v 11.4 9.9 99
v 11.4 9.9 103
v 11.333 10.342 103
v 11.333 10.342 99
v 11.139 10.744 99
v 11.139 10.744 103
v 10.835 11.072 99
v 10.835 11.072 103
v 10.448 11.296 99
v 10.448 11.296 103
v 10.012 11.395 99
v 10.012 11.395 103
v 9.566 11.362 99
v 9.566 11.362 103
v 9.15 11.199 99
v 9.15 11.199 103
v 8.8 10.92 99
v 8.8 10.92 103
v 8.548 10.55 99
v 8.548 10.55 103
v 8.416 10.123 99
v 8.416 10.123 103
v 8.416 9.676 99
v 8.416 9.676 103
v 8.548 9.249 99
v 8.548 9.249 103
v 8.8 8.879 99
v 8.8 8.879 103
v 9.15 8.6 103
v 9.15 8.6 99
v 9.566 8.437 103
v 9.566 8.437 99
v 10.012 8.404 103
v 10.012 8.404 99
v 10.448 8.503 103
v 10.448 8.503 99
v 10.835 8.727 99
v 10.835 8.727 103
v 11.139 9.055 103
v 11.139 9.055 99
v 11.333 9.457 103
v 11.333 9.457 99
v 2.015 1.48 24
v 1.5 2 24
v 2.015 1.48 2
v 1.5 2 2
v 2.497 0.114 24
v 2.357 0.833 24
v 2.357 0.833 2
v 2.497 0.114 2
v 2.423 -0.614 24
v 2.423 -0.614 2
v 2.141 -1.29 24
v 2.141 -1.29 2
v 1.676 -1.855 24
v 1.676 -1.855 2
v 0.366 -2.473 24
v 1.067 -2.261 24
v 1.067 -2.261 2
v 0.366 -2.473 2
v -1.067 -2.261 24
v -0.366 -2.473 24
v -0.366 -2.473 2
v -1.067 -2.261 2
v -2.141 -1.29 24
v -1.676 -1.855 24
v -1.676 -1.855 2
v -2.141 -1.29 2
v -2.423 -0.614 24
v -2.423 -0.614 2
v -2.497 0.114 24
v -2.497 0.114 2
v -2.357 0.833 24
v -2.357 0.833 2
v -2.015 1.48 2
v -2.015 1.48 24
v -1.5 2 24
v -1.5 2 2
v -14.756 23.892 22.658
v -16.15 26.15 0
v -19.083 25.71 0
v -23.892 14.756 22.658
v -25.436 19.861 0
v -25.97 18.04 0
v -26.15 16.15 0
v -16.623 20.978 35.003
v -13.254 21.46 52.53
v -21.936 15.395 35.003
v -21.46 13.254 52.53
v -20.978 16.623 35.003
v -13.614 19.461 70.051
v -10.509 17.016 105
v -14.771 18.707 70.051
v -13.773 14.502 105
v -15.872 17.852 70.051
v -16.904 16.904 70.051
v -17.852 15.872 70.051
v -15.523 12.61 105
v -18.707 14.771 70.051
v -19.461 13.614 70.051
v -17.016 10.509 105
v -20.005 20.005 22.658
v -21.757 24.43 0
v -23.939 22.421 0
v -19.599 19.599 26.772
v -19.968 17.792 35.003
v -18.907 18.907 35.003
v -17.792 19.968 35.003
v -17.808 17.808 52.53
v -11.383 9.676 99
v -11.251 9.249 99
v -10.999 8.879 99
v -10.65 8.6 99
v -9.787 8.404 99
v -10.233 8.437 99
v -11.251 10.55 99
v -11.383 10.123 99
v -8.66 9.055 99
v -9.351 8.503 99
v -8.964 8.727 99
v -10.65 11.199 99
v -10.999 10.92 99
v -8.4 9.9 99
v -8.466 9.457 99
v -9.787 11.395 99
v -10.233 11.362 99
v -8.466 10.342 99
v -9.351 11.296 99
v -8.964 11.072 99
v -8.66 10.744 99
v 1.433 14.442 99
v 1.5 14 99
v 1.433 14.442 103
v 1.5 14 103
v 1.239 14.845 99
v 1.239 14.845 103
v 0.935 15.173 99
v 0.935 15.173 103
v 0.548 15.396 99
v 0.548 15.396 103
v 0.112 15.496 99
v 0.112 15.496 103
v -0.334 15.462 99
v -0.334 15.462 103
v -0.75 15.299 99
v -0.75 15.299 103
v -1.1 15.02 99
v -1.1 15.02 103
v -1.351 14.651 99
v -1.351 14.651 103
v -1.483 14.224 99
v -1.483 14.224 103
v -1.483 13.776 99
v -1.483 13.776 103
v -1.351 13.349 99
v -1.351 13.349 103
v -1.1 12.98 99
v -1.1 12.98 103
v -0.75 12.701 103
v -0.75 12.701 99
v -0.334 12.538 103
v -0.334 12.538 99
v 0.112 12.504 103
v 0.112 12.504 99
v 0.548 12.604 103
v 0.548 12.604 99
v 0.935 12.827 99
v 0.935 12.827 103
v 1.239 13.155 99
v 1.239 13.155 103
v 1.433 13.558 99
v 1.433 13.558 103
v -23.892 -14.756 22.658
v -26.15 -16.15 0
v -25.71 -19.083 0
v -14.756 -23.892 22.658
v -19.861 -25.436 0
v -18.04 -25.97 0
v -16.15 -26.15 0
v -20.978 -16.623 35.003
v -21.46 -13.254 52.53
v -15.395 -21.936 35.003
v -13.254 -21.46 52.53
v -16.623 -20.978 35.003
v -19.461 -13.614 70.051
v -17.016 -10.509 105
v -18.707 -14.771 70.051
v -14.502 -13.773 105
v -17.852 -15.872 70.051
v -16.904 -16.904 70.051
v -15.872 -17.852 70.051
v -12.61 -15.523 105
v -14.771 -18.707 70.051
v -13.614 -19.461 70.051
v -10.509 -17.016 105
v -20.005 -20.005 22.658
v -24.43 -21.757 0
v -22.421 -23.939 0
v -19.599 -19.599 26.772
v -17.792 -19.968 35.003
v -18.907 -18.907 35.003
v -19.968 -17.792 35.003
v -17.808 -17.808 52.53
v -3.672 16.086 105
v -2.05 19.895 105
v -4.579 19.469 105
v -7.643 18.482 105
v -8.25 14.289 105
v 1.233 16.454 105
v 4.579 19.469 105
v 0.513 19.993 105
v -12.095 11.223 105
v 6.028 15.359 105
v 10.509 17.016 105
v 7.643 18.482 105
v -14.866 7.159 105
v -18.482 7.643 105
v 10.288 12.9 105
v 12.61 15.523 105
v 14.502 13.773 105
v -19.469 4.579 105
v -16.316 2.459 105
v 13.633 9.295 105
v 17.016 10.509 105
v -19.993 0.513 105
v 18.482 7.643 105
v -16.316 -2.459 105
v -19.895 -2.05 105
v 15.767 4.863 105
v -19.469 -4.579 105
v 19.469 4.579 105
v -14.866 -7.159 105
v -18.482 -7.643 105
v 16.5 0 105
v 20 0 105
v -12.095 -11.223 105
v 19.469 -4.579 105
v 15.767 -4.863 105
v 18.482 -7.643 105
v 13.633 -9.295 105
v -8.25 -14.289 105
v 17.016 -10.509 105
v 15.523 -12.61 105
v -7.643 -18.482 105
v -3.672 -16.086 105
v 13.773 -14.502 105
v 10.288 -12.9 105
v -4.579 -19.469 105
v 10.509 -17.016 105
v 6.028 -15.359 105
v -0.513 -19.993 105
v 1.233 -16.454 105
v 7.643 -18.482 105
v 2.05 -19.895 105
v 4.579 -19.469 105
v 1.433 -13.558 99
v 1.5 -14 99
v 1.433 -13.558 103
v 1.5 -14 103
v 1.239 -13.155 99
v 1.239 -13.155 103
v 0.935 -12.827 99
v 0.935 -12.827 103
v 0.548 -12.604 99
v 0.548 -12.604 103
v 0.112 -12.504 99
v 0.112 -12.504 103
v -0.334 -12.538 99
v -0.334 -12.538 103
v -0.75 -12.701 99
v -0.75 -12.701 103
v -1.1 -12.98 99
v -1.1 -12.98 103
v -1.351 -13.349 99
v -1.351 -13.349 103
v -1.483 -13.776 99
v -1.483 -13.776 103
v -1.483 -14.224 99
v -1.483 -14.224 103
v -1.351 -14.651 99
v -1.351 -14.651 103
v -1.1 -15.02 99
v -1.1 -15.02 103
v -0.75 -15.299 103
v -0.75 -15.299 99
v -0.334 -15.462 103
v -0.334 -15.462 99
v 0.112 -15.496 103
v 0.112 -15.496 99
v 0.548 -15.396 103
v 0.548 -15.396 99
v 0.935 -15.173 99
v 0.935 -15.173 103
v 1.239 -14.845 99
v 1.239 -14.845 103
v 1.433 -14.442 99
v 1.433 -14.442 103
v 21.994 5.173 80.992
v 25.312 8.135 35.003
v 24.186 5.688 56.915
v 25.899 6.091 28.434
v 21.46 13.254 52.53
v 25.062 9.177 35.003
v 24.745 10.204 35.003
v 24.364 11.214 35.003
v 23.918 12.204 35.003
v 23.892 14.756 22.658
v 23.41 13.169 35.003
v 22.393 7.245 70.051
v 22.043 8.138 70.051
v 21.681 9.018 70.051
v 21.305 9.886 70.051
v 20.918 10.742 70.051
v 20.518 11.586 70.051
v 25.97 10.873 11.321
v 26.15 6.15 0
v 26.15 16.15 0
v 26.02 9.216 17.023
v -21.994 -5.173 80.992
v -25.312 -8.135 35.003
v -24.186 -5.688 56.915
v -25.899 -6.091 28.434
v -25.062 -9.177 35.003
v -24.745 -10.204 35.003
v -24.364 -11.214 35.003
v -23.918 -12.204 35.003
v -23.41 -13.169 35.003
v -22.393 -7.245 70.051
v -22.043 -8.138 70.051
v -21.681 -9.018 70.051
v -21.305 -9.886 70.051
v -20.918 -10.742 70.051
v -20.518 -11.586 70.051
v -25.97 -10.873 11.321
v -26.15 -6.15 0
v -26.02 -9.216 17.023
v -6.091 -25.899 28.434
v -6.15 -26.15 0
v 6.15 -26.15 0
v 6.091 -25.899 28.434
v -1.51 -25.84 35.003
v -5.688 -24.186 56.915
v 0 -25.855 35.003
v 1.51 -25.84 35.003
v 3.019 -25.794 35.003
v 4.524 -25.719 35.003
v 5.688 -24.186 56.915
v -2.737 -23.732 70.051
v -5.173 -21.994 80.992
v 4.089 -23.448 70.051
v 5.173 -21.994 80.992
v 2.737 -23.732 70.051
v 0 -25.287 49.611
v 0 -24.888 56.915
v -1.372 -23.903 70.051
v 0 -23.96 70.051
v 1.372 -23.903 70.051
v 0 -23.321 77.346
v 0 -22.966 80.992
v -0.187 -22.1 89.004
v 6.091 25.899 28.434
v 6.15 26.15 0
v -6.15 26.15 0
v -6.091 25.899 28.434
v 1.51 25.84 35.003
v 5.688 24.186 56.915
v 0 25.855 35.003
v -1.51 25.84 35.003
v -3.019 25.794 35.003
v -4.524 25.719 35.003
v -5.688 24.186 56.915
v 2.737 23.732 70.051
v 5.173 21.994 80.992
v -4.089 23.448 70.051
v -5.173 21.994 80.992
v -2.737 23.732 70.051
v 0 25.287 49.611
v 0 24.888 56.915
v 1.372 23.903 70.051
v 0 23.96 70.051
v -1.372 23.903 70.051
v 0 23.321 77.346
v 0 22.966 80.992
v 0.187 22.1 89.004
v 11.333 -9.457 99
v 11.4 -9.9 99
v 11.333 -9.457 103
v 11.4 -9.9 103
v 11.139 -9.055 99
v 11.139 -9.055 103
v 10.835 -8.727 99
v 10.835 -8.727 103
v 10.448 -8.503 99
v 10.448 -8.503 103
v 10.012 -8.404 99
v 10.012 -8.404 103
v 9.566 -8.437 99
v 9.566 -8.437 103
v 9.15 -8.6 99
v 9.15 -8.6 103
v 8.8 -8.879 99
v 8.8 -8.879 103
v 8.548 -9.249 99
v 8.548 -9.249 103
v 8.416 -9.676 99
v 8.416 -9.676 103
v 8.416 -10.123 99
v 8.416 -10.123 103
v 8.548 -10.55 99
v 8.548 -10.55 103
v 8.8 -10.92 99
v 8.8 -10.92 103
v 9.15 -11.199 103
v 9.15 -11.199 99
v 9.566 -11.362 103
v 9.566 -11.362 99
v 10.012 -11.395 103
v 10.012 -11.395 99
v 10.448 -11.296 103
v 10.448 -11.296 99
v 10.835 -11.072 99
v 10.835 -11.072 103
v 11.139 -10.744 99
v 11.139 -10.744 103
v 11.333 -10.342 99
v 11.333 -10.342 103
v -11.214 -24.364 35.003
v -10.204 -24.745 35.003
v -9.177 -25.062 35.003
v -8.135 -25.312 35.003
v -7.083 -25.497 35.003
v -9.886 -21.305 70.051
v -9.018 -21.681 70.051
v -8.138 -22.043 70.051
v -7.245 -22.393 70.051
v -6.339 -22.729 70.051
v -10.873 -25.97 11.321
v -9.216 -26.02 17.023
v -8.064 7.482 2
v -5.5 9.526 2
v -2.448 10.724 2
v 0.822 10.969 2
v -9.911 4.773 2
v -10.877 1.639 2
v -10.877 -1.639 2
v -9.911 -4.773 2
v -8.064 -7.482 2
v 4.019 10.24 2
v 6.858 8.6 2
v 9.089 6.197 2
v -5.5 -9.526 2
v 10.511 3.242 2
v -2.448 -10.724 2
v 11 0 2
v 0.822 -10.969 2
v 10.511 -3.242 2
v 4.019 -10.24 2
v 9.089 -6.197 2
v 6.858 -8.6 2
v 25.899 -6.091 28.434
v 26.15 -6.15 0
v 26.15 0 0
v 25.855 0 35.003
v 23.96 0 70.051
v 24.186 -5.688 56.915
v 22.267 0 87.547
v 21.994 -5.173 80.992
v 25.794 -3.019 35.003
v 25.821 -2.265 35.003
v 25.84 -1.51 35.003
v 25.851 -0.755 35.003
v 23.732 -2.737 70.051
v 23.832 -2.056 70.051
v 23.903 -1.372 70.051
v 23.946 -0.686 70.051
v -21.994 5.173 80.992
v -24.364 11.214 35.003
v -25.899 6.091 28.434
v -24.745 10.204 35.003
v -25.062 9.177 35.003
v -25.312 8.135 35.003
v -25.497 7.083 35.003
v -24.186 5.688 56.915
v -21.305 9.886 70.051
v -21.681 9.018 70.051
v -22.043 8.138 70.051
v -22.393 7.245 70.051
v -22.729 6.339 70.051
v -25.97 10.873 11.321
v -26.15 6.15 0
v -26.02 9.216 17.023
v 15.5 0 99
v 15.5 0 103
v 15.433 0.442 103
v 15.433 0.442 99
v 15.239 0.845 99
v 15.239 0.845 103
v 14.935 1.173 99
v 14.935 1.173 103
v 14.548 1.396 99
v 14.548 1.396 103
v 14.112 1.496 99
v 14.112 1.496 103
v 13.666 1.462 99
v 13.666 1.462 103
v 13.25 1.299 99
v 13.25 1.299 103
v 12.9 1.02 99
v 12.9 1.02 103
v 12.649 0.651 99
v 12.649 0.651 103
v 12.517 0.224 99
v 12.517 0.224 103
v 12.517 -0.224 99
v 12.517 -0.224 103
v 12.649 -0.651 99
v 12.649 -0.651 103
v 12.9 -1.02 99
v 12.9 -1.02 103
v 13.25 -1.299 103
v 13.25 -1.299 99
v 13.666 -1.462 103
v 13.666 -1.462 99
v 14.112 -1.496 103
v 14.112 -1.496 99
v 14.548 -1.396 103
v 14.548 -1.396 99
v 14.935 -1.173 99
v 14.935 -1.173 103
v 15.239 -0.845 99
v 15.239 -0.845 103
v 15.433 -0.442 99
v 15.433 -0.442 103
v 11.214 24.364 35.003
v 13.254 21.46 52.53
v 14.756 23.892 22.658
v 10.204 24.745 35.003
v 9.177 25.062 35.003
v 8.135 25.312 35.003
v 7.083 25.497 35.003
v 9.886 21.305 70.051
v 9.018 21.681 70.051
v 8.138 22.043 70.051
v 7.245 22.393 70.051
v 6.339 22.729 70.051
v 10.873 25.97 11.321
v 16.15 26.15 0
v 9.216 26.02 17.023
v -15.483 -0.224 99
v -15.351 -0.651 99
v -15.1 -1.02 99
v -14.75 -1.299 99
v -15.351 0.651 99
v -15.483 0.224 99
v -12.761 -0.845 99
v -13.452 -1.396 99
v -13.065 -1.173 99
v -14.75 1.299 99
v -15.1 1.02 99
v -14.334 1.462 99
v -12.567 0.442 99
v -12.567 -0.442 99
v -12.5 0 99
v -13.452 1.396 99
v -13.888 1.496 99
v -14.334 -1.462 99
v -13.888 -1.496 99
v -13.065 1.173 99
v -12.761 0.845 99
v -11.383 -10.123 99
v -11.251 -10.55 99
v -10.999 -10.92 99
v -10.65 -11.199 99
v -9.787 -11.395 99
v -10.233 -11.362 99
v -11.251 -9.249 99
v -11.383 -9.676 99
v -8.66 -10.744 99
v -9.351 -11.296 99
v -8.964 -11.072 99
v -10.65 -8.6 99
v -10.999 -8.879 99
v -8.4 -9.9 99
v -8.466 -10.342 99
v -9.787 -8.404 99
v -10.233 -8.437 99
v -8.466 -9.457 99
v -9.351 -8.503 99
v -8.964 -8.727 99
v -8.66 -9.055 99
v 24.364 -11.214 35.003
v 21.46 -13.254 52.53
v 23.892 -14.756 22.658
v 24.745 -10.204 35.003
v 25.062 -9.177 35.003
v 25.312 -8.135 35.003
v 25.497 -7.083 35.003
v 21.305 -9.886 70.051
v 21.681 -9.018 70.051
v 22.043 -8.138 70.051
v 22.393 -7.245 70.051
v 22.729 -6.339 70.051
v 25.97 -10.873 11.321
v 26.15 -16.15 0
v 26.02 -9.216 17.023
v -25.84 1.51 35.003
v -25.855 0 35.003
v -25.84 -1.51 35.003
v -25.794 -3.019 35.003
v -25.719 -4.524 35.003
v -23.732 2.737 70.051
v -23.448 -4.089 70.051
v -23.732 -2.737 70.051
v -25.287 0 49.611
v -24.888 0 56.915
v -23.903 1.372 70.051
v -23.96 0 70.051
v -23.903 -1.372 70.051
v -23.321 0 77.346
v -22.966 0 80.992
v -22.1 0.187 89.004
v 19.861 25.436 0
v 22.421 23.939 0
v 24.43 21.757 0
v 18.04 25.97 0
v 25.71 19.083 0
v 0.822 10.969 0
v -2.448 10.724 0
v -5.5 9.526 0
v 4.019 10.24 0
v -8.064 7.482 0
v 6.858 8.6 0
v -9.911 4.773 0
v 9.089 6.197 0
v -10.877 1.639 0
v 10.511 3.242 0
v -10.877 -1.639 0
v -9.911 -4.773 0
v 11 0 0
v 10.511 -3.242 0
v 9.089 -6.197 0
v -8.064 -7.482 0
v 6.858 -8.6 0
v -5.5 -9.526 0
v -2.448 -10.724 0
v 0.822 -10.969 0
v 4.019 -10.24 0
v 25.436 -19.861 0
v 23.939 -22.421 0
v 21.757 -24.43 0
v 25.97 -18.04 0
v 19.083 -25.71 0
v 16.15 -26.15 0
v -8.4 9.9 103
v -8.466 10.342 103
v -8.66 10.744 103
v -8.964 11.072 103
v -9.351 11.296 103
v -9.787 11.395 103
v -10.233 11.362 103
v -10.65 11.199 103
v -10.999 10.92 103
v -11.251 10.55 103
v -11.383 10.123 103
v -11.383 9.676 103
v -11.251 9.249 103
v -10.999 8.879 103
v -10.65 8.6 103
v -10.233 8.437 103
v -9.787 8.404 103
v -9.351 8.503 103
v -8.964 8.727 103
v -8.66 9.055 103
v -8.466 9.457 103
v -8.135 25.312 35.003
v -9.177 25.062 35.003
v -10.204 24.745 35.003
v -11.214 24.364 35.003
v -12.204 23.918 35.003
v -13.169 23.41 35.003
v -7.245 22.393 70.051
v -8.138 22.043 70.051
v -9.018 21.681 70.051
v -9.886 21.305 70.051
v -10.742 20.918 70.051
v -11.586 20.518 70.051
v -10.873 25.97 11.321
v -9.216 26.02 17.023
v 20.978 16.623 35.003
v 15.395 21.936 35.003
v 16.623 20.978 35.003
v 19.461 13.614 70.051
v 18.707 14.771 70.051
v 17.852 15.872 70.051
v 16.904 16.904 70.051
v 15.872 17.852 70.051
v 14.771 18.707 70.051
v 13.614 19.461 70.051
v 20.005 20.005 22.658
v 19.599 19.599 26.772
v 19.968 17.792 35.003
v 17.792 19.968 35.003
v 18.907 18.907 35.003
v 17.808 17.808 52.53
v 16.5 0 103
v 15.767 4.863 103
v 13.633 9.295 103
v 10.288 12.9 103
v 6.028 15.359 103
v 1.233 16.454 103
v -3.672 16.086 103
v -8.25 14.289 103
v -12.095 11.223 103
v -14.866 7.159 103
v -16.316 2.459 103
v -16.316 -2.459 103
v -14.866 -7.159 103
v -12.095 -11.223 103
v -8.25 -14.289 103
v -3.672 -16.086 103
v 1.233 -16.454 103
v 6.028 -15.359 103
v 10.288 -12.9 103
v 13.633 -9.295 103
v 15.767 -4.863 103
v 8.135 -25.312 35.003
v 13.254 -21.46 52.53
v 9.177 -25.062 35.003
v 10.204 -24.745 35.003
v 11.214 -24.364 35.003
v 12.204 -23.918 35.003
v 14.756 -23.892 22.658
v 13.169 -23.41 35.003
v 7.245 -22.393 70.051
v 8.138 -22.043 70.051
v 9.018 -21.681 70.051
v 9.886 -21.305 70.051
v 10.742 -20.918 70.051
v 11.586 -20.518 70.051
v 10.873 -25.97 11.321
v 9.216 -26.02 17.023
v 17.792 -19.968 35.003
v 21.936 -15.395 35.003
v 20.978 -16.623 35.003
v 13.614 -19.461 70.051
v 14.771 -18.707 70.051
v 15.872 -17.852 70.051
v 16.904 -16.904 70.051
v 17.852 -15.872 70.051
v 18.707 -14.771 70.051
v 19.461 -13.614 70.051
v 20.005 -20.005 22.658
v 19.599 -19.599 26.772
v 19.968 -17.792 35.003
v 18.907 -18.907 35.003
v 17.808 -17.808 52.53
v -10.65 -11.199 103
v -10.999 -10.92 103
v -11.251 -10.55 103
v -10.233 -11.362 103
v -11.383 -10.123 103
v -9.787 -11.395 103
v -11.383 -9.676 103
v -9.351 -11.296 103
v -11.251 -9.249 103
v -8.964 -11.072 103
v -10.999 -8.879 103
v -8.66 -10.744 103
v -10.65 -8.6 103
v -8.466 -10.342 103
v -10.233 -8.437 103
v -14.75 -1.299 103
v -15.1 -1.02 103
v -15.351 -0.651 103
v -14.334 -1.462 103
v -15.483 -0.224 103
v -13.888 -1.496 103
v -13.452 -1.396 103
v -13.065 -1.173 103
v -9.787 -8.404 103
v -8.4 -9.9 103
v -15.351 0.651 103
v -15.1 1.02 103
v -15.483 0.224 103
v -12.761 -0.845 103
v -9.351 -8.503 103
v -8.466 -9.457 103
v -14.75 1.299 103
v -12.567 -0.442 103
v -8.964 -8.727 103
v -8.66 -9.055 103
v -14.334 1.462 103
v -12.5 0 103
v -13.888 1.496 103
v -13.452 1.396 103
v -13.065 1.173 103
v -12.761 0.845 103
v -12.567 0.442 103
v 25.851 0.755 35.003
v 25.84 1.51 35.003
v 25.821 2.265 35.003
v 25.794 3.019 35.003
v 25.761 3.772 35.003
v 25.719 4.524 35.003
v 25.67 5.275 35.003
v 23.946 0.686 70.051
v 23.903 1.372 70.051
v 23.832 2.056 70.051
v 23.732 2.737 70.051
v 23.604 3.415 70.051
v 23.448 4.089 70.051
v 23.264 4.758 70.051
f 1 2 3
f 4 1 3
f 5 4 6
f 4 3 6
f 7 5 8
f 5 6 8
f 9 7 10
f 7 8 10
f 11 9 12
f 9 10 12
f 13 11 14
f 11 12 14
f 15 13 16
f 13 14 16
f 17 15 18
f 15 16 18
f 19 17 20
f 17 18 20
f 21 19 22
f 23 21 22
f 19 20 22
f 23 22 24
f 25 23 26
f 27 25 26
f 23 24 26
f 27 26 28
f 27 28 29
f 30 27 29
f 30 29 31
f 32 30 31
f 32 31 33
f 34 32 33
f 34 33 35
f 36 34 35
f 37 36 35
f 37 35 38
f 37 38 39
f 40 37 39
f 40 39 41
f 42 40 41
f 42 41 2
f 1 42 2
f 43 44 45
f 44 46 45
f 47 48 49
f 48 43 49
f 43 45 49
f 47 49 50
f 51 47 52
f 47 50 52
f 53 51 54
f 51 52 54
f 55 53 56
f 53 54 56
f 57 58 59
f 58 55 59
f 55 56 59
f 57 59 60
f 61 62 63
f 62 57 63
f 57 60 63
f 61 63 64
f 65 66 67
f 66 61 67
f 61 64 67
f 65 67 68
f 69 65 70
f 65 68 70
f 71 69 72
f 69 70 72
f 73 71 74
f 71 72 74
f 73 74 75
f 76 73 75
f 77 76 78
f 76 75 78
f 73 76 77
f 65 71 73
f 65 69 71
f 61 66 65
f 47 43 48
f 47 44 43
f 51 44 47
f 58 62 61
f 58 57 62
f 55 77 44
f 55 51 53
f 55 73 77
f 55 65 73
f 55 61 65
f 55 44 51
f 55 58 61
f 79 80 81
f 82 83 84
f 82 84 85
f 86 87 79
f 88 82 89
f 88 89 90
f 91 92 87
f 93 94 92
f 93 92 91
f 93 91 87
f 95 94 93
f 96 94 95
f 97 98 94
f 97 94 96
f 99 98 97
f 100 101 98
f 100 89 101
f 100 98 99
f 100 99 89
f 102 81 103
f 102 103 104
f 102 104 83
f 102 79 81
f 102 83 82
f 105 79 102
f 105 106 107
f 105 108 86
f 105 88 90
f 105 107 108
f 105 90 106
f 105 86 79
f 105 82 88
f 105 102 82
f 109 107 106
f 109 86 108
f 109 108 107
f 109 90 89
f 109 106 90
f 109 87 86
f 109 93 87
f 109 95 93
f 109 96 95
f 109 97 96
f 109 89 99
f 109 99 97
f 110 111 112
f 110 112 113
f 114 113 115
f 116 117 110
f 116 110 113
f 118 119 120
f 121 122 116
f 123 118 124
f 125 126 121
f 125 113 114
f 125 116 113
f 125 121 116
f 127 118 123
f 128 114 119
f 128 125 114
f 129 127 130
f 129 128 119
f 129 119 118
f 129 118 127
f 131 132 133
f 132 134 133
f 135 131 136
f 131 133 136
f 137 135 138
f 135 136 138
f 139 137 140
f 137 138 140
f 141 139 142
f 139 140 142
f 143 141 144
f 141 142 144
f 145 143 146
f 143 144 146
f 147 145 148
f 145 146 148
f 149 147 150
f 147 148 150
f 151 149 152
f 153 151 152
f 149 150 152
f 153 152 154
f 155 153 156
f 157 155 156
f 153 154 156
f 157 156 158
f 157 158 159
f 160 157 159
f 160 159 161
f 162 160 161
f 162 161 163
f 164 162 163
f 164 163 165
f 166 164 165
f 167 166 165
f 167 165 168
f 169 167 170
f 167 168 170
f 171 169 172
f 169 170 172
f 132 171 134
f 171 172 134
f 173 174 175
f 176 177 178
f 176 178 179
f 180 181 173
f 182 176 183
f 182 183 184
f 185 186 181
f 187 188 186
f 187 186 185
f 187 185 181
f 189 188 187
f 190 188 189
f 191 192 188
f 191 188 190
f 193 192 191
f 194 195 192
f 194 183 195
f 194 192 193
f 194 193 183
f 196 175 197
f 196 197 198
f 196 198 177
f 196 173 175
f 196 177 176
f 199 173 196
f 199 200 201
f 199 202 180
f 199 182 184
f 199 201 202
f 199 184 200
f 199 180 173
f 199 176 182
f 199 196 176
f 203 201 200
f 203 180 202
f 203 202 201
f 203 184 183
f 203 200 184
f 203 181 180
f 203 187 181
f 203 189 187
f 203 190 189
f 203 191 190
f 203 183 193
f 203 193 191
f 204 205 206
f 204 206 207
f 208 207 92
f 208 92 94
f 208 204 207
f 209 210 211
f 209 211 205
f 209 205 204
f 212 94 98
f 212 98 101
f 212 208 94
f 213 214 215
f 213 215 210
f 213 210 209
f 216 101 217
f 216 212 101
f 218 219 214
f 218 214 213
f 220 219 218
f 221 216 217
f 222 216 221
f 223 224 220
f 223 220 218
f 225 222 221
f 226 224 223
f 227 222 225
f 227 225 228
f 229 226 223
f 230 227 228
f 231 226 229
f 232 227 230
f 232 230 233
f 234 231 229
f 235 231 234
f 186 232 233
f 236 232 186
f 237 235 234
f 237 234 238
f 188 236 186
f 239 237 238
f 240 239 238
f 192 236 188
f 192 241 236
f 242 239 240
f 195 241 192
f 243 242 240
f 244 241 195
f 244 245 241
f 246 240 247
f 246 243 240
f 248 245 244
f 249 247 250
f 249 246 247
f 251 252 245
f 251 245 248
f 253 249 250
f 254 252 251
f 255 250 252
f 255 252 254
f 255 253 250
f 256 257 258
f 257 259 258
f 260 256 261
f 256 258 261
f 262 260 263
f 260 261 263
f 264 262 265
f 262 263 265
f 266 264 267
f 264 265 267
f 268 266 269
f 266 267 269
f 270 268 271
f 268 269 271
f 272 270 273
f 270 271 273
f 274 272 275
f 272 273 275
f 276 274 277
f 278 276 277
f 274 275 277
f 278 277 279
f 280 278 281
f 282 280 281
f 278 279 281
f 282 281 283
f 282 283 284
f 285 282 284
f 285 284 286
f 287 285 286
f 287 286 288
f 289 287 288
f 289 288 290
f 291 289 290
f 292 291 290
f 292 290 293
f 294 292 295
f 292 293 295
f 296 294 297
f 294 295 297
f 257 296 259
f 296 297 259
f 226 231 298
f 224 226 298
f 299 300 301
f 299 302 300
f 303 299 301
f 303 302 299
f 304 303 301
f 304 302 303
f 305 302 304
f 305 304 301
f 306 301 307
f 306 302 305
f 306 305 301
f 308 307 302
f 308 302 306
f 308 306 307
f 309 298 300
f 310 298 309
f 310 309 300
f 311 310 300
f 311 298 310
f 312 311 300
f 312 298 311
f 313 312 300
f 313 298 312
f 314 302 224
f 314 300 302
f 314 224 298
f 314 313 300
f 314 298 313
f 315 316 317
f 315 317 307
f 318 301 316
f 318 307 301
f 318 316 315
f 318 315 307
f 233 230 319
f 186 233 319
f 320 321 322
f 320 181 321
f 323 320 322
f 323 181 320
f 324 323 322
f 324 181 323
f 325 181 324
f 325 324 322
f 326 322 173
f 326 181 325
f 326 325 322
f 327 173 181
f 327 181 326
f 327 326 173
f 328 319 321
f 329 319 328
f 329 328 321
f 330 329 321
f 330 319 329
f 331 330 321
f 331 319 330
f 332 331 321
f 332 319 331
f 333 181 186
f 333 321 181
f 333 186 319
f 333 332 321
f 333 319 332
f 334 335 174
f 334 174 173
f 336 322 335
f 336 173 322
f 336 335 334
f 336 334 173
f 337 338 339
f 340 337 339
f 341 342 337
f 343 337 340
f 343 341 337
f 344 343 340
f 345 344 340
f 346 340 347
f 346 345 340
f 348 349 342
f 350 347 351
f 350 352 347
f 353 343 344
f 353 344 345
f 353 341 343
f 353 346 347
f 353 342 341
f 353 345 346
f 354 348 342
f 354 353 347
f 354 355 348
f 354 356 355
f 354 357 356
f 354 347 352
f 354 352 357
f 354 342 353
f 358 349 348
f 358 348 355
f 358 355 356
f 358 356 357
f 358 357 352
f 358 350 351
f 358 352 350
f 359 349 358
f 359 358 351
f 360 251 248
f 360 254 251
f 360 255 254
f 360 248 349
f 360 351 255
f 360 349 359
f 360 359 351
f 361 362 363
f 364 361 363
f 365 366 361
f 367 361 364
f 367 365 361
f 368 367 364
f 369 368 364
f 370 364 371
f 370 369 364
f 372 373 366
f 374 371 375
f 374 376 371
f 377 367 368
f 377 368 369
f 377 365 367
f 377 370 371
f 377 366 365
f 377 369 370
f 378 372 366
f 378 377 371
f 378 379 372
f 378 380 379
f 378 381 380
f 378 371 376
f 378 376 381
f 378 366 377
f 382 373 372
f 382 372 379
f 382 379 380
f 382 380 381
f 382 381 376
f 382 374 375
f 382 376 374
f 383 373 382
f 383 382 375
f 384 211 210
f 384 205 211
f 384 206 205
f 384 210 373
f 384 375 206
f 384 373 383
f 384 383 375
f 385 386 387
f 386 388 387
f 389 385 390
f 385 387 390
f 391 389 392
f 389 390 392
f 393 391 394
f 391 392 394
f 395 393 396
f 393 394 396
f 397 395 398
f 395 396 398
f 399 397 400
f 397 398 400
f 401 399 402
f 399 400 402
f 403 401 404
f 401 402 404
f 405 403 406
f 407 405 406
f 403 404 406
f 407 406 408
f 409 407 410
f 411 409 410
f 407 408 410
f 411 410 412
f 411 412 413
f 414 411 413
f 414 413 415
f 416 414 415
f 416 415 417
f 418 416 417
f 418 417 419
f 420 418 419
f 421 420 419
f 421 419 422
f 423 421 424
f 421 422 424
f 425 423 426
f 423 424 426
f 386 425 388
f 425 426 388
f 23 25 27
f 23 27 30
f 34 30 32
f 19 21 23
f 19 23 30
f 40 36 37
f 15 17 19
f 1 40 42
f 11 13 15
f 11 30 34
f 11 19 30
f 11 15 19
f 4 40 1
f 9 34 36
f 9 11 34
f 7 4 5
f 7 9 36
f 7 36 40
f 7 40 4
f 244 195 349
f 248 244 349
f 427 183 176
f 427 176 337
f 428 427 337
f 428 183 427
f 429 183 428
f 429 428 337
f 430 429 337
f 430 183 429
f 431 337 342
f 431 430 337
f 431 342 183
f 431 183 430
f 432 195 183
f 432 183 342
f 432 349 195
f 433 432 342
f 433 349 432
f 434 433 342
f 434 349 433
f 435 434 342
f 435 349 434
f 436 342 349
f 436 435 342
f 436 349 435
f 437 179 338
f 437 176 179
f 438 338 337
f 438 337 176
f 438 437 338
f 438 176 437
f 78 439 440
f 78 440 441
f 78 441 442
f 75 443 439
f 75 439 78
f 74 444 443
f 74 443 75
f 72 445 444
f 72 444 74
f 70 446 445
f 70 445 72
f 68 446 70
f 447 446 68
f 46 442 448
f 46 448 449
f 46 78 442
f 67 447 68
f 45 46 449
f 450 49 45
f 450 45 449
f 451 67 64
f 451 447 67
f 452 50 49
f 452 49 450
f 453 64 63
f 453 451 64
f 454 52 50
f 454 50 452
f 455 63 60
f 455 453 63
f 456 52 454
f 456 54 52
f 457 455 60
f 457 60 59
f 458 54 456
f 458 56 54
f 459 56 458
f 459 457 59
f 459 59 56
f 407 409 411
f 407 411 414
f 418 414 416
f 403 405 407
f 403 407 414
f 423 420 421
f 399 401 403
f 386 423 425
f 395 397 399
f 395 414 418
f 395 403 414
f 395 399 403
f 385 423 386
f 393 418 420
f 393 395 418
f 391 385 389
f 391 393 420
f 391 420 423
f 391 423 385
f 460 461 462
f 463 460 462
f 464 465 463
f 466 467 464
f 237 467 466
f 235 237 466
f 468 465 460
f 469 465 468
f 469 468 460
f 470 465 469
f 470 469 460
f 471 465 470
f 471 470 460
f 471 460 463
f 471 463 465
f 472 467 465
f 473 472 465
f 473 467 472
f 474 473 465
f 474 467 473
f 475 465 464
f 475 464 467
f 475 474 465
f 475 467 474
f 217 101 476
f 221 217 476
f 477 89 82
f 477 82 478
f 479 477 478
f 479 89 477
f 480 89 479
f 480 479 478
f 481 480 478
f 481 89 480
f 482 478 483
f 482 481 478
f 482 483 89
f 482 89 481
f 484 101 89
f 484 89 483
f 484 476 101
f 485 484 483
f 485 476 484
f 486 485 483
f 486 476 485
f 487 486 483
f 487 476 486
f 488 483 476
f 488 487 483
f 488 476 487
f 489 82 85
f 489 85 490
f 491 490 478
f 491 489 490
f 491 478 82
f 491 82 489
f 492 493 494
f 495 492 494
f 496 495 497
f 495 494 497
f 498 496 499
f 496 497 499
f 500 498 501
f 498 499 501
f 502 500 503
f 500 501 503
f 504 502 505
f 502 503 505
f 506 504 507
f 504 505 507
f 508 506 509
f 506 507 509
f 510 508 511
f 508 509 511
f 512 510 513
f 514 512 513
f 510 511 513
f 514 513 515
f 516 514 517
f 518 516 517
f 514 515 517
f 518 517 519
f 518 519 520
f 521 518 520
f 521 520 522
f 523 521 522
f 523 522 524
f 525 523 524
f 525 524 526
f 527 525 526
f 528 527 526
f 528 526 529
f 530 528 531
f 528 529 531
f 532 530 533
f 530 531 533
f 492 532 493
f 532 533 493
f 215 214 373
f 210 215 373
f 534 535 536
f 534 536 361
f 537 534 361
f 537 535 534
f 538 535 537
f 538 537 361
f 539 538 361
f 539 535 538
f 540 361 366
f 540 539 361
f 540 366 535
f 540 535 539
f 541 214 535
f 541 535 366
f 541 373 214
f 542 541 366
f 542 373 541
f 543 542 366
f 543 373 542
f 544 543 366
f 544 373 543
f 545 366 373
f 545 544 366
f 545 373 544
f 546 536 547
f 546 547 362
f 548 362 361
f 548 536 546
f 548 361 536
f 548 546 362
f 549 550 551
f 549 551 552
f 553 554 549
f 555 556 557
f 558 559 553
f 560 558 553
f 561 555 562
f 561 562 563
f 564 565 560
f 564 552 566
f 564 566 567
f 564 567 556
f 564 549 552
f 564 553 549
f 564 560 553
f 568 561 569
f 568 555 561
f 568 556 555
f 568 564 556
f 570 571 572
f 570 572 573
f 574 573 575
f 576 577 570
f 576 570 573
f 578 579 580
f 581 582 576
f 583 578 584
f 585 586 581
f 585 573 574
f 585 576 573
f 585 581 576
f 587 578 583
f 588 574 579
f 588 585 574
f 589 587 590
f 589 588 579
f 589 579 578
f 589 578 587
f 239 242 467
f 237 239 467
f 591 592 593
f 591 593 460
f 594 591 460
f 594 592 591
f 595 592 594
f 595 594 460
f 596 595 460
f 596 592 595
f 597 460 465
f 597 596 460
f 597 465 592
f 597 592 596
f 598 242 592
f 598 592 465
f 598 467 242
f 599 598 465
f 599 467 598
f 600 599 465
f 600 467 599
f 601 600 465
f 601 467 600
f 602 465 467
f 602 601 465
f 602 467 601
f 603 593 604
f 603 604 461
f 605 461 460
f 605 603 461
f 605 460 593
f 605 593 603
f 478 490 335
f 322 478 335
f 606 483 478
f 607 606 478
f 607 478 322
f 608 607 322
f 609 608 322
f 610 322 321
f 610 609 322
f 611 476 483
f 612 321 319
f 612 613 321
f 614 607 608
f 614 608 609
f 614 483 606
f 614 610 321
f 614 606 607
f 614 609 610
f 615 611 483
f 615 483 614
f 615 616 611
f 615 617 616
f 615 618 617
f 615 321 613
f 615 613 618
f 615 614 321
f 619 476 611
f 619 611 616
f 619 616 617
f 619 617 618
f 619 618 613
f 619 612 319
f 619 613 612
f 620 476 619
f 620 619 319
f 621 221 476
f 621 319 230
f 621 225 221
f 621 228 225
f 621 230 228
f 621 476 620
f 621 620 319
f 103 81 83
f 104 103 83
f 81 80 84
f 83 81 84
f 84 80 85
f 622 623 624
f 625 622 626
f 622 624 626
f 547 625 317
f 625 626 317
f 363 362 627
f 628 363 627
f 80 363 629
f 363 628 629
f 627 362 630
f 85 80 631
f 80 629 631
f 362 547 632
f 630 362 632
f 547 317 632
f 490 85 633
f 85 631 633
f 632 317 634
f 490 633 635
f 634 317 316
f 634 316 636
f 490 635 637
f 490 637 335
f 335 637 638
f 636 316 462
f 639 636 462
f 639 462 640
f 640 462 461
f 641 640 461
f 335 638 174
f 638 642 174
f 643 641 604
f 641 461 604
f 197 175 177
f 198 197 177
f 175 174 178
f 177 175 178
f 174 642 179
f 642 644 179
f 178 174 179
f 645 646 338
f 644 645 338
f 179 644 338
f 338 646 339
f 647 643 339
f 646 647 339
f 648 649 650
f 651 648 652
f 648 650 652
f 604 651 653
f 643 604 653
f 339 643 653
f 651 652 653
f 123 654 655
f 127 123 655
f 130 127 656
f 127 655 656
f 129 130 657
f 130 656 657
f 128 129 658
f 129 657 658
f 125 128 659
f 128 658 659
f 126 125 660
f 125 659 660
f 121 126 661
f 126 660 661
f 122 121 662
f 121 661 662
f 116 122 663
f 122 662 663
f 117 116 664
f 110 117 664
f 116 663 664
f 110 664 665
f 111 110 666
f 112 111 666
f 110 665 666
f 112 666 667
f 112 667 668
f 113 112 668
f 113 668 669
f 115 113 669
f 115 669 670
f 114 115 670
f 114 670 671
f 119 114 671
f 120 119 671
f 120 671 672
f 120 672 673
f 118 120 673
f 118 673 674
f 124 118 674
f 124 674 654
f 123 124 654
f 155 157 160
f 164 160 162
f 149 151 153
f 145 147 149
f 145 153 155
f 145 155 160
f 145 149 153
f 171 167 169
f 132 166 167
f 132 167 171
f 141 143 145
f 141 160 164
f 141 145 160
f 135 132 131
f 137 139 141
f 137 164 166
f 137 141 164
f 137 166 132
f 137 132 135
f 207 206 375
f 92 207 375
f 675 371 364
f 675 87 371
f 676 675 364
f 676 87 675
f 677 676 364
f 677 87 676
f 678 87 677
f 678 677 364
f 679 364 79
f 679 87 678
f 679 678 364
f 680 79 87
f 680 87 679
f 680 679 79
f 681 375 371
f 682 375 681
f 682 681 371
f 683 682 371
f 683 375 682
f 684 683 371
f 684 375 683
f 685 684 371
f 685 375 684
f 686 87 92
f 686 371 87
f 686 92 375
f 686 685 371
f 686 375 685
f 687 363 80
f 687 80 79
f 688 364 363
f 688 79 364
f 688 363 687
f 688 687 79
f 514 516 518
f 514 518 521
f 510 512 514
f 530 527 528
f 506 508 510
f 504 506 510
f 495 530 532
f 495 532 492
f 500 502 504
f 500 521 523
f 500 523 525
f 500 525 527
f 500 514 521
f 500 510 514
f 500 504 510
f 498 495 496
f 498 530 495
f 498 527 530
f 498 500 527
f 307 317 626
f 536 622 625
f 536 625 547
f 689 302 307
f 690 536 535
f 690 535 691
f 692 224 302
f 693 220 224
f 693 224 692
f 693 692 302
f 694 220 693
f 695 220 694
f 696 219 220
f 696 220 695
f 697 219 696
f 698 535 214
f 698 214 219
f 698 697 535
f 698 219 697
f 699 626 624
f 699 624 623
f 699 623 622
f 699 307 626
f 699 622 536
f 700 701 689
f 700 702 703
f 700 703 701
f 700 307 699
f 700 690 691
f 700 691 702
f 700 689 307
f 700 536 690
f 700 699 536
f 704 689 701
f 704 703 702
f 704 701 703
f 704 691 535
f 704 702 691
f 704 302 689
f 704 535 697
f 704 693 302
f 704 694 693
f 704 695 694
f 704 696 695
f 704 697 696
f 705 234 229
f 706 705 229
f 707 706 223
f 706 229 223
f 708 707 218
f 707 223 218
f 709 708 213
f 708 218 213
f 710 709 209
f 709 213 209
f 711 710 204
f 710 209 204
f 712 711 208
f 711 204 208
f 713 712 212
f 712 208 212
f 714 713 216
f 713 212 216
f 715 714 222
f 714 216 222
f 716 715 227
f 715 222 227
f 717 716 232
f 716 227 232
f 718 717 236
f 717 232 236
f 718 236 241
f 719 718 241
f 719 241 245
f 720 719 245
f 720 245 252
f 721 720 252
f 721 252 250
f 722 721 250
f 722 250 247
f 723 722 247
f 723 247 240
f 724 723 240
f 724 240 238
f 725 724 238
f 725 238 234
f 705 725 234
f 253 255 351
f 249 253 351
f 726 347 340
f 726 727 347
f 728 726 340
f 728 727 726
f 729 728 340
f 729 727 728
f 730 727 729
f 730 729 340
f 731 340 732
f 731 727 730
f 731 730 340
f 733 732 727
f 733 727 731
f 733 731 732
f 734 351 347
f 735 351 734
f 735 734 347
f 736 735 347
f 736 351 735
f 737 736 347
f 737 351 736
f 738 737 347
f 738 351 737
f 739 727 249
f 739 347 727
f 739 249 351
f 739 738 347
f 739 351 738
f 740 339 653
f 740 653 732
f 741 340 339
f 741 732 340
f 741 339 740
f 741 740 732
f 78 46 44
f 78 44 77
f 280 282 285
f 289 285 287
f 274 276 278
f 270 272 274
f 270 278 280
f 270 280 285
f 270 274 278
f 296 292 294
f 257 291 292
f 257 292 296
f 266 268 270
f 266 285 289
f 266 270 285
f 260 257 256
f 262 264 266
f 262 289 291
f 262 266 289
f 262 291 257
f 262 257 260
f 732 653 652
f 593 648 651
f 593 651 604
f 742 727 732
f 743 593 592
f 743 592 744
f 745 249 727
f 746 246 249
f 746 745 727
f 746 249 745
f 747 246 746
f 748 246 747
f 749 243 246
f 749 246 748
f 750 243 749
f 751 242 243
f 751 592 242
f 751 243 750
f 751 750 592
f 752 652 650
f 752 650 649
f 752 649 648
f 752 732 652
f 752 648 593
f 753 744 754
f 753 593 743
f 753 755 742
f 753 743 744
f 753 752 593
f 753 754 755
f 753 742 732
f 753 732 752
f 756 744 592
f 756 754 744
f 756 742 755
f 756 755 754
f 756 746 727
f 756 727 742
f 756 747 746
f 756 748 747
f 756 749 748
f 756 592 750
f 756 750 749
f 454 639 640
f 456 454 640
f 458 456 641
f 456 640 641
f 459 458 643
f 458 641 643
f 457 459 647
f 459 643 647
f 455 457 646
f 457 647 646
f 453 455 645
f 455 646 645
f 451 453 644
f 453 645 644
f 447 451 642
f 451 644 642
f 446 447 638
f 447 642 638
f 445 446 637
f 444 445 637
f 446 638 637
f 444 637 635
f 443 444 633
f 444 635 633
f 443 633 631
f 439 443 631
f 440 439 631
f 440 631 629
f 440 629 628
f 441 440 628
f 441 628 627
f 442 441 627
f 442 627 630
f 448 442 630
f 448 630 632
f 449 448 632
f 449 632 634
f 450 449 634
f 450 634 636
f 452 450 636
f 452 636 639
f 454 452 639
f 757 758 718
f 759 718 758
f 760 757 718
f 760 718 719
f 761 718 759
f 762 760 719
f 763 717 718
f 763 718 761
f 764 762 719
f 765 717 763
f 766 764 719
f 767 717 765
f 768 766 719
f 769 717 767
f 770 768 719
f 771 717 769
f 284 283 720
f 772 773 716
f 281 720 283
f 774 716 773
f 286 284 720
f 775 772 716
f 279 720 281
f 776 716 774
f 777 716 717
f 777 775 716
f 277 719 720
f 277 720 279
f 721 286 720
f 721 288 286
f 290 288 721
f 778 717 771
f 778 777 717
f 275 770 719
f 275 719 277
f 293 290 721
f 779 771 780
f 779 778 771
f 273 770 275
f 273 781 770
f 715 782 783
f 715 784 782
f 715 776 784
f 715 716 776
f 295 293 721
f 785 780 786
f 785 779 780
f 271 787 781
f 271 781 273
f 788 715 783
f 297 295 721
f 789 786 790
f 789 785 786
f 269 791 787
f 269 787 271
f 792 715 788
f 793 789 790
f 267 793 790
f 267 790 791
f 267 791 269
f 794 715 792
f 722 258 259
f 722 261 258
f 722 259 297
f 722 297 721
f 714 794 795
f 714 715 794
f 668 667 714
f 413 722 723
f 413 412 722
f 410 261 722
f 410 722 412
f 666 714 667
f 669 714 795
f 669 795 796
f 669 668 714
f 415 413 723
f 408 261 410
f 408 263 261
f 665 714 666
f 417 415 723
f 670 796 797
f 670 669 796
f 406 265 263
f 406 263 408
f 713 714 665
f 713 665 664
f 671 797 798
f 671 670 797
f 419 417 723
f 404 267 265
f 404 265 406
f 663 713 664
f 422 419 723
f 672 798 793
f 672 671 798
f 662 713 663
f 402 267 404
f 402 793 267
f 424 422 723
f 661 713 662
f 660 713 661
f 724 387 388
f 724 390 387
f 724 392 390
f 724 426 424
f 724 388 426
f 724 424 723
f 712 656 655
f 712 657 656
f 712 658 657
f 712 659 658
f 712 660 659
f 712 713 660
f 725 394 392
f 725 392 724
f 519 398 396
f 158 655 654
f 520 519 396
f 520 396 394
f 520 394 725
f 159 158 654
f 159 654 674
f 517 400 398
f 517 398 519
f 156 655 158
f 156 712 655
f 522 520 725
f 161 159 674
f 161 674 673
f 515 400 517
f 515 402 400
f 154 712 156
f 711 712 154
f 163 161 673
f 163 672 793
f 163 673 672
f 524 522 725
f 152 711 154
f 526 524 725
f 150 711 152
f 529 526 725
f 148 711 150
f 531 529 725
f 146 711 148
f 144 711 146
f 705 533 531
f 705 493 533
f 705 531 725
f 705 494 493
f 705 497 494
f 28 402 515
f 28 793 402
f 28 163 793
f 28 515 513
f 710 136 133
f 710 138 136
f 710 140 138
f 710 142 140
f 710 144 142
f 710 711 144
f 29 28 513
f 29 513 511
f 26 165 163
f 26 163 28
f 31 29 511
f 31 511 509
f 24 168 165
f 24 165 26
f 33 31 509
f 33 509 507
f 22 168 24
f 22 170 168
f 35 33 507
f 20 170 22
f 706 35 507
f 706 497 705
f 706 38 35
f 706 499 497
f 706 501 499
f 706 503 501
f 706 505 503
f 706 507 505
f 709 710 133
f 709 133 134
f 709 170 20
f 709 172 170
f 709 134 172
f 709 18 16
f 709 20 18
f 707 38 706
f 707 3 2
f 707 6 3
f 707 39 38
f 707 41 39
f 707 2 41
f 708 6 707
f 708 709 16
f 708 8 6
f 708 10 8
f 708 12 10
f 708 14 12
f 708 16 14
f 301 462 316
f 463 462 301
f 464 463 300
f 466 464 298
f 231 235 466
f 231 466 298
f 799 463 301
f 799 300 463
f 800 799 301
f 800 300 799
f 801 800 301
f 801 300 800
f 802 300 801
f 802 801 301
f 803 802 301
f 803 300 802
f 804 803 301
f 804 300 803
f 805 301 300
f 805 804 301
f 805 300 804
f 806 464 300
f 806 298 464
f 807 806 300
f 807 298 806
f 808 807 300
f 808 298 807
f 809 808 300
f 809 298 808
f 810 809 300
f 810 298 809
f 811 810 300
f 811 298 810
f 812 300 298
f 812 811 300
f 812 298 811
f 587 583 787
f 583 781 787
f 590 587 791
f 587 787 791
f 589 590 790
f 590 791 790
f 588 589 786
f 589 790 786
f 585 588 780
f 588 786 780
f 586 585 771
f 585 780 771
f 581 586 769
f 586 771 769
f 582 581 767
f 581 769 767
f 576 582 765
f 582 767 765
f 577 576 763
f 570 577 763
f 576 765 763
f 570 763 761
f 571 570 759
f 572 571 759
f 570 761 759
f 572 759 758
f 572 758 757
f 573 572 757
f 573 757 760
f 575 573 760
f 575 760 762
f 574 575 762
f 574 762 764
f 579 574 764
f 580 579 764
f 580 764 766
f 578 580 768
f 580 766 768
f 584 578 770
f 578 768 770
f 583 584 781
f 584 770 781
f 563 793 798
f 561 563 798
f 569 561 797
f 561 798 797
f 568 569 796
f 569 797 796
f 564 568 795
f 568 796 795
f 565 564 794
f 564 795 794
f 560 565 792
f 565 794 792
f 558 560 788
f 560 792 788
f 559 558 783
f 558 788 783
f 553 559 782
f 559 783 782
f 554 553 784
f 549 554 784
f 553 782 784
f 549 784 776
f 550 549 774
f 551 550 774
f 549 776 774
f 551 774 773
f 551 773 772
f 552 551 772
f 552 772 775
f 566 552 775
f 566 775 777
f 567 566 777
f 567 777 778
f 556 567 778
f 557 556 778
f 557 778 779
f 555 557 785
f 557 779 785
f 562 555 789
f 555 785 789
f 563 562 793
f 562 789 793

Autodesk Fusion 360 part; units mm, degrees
sketch "Sketch7" plane through (0, 0, 0) normal (0, 0, 1) x (1, 0, 0)
  line L0 (-16.15, 26.15) -> (16.15, 26.15)
  line L1 (26.15, 16.15) -> (26.15, -16.15)
  line L2 (16.15, -26.15) -> (-16.15, -26.15)
  line L3 (-26.15, -16.15) -> (-26.15, 16.15)
  arc A0 (-16.15, 26.15) -> (-26.15, 16.15) centre (-16.15, 16.15) ccw
  arc A1 (-26.15, -16.15) -> (-16.15, -26.15) centre (-16.15, -16.15) ccw
  arc A2 (16.15, -26.15) -> (26.15, -16.15) centre (16.15, -16.15) ccw
  arc A3 (26.15, 16.15) -> (16.15, 26.15) centre (16.15, 16.15) ccw
  point P0 (-26.15, 26.15)
  point P1 (26.15, 26.15)
  point P2 (-26.15, -26.15)
  dimension "d26" = 52.3
  dimension "d27" = 52.3
  dimension "d28" = 26.15
  dimension "d29" = 26.15
  dimension "d30" = 10
ref_plane "WorkPlane4" through (0, 0, 20) normal (0, 0, 1) x (1, 0, 0)
sketch "Sketch8" plane through (0, 0, 20) normal (0, 0, 1) x (1, 0, 0)
  line L0 (-6.15, 26.15) -> (6.15, 26.15)
  line L1 (26.15, 6.15) -> (26.15, -6.15)
  line L2 (6.15, -26.15) -> (-6.15, -26.15)
  line L3 (-26.15, -6.15) -> (-26.15, 6.15)
  arc A0 (-6.15, 26.15) -> (-26.15, 6.15) centre (-6.15, 6.15) ccw
  arc A1 (26.15, 6.15) -> (6.15, 26.15) centre (6.15, 6.15) ccw
  arc A2 (6.15, -26.15) -> (26.15, -6.15) centre (6.15, -6.15) ccw
  arc A3 (-26.15, -6.15) -> (-6.15, -26.15) centre (-6.15, -6.15) ccw
  point P0 (26.15, 26.15)
  point P1 (26.15, -26.15)
  point P2 (-26.15, -26.15)
  dimension "d41" = 52.3
  dimension "d42" = 52.3
  dimension "d43" = 26.15
  dimension "d44" = 26.15
  dimension "d45" = 20
ref_plane "WorkPlane5" through (0, 0, 55) normal (0, 0, 1) x (1, 0, 0)
sketch "Sketch9" plane through (0, 0, 55) normal (0, 0, 1) x (1, 0, 0)
  circle A0 centre (0, 0) radius 25
ref_plane "WorkPlane6" through (0, 0, 105) normal (0, 0, 1) x (1, 0, 0)
sketch "Sketch10" plane through (0, 0, 105) normal (0, 0, 1) x (1, 0, 0)
  circle A0 centre (0, 0) radius 20
  circle A1 centre (0, 0) radius 16.5
  circle A2 centre (0, 14) radius 1.5
  circle A3 centre (-9.8995, 9.8995) radius 1.5
  circle A4 centre (-14, 0) radius 1.5
  circle A5 centre (-9.8995, -9.8995) radius 1.5
  circle A6 centre (0, -14) radius 1.5
  circle A7 centre (9.8995, -9.8995) radius 1.5
  circle A8 centre (14, 0) radius 1.5
  circle A9 centre (9.8995, 9.8995) radius 1.5
  dimension "d35" = 33
  dimension "d36" = 3
  dimension "d37" = 14
  dimension "d38" = 40
  dimension "d40" = 360
loft "Loft3" add profiles "Sketch7", "Sketch8", "Sketch9", "Sketch10" section 1 section 2 section 3 section 4 contours A0
extrude "Extrude6" cut sketch "Sketch10" against normal blind 2 contours A1
extrude "Extrude7" cut sketch "Sketch10" against normal blind 6 contours A2 | A3 | A4 | A5 | A6 | A7 | A8 | A9
sketch "Sketch11" plane through (0, 0, 0) normal (0, 0, -1) x (1, 0, 0)
  spline S0 degree 3 number of poles 76
  circle A0 centre (0, 0) radius 2.5
  line L0 (4.103, -2) -> (-9.0317, -2)
  circle A1 centre (0, 0) radius 11
  dimension "d50" = 5
  dimension "d51" = 2
  dimension "d54" = 22
extrude "Extrude8" cut sketch "Sketch11" against normal blind 24 contours A0 L0 picked at (0.2207, 0.7145)
extrude "Extrude9" cut sketch "Sketch11" against normal blind 2 contours A0 L0 | A1 picked at (0.3999, -2.0645)
equation "WallThickness = 1.6 mm"
equation "Tolerance = 0.2 mm"
equation "BoltHoleDia = 3.2 mm"
